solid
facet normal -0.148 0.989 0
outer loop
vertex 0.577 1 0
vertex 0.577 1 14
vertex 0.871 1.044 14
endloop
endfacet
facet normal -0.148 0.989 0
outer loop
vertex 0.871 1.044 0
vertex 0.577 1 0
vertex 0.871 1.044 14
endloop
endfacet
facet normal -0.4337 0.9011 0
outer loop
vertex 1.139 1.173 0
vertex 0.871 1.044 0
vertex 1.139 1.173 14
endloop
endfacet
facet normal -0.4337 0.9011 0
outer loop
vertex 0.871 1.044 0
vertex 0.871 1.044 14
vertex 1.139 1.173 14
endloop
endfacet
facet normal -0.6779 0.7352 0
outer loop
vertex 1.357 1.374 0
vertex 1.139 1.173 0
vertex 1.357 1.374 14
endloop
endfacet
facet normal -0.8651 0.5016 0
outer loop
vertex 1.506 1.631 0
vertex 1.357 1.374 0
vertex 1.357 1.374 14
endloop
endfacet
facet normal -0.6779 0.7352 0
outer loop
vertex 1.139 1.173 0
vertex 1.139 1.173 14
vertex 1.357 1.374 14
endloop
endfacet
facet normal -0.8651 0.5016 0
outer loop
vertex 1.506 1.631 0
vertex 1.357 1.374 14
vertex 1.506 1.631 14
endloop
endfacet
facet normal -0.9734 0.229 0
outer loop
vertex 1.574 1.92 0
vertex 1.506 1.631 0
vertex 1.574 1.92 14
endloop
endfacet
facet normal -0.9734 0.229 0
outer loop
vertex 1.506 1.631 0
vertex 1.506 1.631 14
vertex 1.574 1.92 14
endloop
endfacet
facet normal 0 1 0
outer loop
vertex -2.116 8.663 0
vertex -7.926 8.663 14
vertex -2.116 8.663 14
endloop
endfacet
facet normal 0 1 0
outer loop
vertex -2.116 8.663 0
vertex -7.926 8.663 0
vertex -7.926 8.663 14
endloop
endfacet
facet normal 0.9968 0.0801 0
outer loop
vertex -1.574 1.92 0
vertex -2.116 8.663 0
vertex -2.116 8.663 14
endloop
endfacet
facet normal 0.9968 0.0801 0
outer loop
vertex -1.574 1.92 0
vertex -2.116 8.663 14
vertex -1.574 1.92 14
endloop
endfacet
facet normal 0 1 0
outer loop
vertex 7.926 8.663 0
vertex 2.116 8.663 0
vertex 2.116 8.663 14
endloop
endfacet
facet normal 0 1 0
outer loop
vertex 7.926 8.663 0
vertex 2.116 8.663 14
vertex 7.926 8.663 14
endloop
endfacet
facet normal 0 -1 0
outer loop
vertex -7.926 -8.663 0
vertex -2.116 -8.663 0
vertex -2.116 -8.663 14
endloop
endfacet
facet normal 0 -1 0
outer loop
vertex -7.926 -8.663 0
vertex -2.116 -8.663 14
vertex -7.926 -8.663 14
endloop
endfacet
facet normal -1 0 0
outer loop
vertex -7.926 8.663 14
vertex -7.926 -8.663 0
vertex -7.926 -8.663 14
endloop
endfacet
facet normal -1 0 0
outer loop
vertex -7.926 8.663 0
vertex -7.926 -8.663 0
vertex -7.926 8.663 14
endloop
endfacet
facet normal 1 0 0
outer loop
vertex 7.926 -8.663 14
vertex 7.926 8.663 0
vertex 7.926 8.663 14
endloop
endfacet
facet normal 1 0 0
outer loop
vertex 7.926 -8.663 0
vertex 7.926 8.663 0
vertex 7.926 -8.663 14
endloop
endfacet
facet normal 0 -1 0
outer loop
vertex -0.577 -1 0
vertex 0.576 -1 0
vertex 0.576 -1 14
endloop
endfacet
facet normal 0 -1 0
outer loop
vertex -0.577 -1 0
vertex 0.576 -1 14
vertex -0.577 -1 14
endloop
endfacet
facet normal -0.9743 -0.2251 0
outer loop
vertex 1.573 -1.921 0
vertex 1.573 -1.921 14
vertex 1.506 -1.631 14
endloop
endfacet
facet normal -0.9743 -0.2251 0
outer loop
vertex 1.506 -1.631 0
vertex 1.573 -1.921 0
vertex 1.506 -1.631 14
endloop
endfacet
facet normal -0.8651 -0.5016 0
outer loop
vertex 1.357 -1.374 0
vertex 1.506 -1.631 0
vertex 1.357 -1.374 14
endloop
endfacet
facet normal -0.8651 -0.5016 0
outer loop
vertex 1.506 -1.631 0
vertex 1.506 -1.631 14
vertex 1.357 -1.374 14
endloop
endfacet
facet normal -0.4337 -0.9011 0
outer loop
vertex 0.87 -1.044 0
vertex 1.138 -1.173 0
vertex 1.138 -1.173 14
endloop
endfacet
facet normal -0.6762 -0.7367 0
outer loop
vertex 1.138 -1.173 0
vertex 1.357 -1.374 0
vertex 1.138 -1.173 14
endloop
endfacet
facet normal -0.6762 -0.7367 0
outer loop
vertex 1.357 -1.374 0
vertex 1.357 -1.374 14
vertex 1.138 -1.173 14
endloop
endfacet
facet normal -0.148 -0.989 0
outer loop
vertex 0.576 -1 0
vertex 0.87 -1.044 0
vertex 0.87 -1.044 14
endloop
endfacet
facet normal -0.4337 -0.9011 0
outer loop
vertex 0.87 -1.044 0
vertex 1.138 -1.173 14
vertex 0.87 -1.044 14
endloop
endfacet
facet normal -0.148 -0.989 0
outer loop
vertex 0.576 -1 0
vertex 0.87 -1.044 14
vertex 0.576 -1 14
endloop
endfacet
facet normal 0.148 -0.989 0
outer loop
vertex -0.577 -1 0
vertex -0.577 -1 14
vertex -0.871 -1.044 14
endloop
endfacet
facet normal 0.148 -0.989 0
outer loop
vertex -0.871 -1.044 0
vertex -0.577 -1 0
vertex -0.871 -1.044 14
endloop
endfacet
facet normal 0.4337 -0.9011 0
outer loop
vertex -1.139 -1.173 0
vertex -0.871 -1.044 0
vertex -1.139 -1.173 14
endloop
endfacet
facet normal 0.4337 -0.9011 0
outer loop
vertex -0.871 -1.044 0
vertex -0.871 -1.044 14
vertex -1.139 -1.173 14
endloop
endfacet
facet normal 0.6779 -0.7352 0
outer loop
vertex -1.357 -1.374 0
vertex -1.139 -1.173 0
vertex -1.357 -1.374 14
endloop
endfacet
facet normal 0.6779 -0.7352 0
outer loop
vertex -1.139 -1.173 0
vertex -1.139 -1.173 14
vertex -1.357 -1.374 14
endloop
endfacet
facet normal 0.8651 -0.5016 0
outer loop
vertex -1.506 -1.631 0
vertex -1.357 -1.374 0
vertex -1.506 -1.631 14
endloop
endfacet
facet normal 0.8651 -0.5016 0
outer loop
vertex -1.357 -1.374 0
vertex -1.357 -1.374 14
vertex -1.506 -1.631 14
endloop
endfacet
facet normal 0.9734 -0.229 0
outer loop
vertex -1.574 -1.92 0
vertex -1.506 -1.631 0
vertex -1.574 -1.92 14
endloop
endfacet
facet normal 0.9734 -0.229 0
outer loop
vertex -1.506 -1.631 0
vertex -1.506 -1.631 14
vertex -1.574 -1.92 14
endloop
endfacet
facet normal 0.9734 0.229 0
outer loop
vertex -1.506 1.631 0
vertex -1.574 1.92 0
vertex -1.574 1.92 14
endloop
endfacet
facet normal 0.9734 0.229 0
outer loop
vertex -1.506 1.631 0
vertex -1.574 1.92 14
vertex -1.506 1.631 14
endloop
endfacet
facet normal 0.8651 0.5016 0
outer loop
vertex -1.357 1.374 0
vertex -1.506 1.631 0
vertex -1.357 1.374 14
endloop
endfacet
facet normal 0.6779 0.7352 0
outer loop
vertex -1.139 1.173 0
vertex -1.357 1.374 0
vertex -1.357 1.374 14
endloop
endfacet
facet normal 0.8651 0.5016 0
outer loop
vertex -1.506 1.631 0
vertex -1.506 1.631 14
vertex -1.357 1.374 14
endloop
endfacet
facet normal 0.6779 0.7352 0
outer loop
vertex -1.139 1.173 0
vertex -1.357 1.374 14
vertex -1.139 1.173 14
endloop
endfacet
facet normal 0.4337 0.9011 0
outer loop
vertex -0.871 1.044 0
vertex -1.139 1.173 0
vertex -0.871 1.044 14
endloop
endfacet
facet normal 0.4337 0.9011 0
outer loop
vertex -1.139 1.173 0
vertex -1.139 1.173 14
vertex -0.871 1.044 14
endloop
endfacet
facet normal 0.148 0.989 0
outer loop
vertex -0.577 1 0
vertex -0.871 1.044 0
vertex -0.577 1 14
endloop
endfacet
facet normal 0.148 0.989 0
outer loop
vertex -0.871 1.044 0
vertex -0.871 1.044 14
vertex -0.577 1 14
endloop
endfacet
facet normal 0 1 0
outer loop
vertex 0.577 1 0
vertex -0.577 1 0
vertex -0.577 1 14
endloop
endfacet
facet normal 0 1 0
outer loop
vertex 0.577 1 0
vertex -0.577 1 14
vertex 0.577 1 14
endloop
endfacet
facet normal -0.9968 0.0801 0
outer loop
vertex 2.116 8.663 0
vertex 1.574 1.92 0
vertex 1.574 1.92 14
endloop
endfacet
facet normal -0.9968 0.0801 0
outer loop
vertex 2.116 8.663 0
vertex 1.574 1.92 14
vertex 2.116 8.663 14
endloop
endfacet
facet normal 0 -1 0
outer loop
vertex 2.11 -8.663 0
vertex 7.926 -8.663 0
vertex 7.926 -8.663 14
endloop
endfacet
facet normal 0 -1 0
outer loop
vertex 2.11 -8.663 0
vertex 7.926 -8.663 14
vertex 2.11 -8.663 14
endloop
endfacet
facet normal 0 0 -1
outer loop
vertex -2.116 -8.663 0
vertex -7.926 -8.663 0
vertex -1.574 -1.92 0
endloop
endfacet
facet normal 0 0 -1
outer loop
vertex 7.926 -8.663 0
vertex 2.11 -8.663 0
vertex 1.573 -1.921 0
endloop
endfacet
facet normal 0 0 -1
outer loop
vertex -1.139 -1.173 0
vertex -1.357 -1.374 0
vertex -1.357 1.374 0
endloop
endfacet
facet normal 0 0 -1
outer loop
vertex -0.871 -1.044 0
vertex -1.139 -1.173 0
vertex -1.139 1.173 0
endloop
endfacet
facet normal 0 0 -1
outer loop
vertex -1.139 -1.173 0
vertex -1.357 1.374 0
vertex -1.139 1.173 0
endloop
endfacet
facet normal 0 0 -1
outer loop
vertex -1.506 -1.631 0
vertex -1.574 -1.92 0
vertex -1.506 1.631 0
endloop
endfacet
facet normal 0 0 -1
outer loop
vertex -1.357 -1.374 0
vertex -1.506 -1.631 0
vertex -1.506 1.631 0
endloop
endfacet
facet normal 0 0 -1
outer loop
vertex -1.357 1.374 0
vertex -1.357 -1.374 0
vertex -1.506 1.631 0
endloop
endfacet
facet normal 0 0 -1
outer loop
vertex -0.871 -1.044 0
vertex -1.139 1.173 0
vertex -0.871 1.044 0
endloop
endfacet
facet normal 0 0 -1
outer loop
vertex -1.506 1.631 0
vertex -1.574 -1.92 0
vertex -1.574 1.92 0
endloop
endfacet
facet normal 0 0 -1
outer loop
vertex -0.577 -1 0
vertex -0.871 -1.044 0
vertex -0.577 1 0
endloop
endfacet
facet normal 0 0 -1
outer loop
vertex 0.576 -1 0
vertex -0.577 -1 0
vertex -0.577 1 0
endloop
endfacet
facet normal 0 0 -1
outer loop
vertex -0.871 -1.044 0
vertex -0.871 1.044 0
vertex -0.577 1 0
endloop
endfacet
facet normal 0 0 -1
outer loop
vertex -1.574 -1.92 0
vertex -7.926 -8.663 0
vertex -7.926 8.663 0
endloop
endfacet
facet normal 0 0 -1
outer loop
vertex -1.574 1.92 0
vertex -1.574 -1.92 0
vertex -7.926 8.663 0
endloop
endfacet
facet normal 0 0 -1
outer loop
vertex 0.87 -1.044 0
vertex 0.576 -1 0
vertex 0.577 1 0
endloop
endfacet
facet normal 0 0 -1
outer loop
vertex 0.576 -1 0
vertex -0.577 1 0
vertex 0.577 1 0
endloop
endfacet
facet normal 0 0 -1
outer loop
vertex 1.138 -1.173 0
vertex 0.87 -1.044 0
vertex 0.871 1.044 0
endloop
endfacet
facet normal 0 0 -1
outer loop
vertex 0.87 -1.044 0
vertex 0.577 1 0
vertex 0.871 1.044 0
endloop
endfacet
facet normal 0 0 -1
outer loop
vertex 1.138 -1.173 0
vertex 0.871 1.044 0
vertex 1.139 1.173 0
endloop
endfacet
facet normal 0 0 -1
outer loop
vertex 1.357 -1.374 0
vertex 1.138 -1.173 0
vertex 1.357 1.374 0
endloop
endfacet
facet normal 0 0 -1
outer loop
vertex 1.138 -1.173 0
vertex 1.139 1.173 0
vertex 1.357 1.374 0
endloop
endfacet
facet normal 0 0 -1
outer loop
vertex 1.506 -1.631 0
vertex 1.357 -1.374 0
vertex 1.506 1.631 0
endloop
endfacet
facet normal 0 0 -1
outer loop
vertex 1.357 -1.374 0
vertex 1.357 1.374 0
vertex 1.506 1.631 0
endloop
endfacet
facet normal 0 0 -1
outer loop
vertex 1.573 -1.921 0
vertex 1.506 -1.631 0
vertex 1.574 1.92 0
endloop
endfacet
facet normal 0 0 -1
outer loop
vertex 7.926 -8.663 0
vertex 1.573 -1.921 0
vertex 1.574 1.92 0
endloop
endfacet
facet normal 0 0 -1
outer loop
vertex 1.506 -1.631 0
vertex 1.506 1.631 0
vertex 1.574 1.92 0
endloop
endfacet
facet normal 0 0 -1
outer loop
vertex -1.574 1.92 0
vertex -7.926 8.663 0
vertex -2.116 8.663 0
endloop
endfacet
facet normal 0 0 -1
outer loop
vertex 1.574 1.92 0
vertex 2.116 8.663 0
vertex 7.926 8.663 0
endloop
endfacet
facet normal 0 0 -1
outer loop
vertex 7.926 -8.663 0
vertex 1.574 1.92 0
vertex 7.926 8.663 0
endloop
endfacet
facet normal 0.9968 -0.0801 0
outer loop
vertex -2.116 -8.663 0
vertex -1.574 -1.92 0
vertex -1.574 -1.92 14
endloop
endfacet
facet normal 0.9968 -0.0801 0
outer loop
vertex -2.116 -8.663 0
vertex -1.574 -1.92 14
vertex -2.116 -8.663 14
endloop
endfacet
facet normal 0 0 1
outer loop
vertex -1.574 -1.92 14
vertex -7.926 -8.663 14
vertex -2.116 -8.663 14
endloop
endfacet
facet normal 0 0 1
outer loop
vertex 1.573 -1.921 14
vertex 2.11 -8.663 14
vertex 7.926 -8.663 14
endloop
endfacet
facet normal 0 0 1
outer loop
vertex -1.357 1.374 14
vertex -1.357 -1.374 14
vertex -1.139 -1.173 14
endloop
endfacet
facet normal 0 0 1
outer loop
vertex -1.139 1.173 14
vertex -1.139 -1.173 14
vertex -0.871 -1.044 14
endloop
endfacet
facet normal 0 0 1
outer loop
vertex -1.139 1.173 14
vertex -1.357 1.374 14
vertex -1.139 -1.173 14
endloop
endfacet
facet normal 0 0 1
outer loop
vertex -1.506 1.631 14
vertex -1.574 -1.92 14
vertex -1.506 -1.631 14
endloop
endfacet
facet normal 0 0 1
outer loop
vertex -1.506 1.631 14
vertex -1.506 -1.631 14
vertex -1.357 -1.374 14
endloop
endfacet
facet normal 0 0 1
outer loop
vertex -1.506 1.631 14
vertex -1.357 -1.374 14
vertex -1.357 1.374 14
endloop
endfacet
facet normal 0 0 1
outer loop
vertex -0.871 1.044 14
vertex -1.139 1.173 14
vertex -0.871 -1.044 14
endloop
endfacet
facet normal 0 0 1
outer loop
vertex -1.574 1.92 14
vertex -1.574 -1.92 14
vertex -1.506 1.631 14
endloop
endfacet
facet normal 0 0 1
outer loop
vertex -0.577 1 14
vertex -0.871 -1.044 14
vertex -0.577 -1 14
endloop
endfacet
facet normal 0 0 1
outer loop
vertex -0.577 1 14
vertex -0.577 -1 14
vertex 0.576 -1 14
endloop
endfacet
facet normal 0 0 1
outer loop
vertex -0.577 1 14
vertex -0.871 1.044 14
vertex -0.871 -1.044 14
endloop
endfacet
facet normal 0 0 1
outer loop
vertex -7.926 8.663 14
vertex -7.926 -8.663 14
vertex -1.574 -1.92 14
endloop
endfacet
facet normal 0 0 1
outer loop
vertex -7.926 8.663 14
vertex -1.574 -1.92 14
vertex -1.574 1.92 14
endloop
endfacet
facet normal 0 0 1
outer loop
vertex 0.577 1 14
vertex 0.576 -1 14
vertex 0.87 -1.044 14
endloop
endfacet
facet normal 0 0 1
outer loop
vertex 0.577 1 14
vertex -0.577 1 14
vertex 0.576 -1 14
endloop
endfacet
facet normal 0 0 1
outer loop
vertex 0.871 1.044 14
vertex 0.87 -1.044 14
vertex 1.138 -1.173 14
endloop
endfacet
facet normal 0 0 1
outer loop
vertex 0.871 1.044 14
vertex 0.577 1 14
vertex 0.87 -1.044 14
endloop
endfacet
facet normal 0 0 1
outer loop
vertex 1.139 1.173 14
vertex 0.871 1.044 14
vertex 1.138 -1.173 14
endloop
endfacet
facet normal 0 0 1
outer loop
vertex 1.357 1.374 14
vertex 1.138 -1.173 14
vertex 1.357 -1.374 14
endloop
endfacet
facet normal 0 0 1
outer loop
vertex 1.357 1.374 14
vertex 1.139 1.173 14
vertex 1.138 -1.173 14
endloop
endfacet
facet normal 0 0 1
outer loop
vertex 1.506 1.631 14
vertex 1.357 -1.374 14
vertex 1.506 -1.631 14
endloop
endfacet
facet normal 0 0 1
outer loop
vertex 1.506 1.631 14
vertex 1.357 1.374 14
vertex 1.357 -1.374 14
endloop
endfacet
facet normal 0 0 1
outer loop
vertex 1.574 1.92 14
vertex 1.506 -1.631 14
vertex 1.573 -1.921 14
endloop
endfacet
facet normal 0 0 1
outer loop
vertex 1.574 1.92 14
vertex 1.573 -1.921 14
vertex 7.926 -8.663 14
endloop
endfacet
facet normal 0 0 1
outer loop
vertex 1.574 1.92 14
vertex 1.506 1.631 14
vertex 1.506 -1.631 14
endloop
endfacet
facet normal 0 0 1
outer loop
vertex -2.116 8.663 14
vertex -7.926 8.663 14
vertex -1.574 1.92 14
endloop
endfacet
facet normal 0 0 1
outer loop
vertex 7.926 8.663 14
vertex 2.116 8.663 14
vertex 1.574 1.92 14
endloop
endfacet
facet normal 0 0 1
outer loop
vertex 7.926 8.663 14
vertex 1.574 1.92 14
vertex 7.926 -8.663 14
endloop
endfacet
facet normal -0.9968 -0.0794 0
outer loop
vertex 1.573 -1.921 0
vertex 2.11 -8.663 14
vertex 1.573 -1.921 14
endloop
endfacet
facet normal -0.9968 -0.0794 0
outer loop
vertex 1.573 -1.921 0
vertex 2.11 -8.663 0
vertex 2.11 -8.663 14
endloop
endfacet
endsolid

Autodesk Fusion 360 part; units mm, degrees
sketch "Sketch1" plane through (0, 0, 0) normal (0, 0, 1) x (1, 0, 0)
  line L0 (-7.9259, 8.6629) -> (-2.1165, 8.6629)
  line L1 (-1.5, 1) -> (-1.5, -1)
  line L2 (-2.1165, -8.6629) -> (-7.9259, -8.6629)
  line L3 (-7.9259, -8.6629) -> (-7.9259, 8.6629)
  line L4 (2.1165, 8.6629) -> (7.9259, 8.6629)
  line L5 (7.9259, 8.6629) -> (7.9259, -8.6629)
  line L6 (7.9259, -8.6629) -> (2.11, -8.6629)
  line L7 (1.5, -1) -> (1.5, 1)
  line L8 (-48.0743, 0) -> (41.8844, 0) construction
  line L9 (1.5, 18.5935) -> (0, 18.5935) construction
  line L10 (0, 0) -> (0, 17.2446) construction
  line L11 (0, 18.5935) -> (-1.5, 18.5935) construction
  line L12 (-1.5, 1) -> (1.5, 1)
  line L13 (1.5, 1) -> (1.5, -1)
  line L14 (1.5, -1) -> (-1.5, -1)
  line L15 (-1.5, -1) -> (-1.5, 1)
  line L16 (-2.1165, 8.6629) -> (-1.5, 1)
  line L17 (-1.5, -1) -> (-2.1165, -8.6629)
  line L18 (2.11, -8.6629) -> (1.5, -1)
  line L19 (-1.5, -1) -> (-1.5, -18.4253) construction
  line L20 (1.5, 0) -> (7.9259, 0) construction
  line L21 (-1.5, 0) -> (-7.9259, 0) construction
  line L22 (1.5, 1) -> (2.1165, 8.6629)
  line L23 (-1.5, 1) -> (-1.5, 16.5395) construction
  point P0 (1.5, 0)
  point P1 (-1.5, 0)
  point P2 (1.5, 0)
  point P3 (7.9259, 0)
  point P4 (-7.9259, 0)
  dimension "d1" = 4.6
  dimension "d2" = 4.6
  dimension "d3" = 2
  dimension "d8" = 3
extrude "Extrude1" add sketch "Sketch1" along normal blind 14
fillet "Fillet1" radius 1 4 edges at (-1.5, -1, 7) (1.5, -1, 7) (-1.5, 1, 7) (1.5, 1, 7)
equation "d2 = d1"
